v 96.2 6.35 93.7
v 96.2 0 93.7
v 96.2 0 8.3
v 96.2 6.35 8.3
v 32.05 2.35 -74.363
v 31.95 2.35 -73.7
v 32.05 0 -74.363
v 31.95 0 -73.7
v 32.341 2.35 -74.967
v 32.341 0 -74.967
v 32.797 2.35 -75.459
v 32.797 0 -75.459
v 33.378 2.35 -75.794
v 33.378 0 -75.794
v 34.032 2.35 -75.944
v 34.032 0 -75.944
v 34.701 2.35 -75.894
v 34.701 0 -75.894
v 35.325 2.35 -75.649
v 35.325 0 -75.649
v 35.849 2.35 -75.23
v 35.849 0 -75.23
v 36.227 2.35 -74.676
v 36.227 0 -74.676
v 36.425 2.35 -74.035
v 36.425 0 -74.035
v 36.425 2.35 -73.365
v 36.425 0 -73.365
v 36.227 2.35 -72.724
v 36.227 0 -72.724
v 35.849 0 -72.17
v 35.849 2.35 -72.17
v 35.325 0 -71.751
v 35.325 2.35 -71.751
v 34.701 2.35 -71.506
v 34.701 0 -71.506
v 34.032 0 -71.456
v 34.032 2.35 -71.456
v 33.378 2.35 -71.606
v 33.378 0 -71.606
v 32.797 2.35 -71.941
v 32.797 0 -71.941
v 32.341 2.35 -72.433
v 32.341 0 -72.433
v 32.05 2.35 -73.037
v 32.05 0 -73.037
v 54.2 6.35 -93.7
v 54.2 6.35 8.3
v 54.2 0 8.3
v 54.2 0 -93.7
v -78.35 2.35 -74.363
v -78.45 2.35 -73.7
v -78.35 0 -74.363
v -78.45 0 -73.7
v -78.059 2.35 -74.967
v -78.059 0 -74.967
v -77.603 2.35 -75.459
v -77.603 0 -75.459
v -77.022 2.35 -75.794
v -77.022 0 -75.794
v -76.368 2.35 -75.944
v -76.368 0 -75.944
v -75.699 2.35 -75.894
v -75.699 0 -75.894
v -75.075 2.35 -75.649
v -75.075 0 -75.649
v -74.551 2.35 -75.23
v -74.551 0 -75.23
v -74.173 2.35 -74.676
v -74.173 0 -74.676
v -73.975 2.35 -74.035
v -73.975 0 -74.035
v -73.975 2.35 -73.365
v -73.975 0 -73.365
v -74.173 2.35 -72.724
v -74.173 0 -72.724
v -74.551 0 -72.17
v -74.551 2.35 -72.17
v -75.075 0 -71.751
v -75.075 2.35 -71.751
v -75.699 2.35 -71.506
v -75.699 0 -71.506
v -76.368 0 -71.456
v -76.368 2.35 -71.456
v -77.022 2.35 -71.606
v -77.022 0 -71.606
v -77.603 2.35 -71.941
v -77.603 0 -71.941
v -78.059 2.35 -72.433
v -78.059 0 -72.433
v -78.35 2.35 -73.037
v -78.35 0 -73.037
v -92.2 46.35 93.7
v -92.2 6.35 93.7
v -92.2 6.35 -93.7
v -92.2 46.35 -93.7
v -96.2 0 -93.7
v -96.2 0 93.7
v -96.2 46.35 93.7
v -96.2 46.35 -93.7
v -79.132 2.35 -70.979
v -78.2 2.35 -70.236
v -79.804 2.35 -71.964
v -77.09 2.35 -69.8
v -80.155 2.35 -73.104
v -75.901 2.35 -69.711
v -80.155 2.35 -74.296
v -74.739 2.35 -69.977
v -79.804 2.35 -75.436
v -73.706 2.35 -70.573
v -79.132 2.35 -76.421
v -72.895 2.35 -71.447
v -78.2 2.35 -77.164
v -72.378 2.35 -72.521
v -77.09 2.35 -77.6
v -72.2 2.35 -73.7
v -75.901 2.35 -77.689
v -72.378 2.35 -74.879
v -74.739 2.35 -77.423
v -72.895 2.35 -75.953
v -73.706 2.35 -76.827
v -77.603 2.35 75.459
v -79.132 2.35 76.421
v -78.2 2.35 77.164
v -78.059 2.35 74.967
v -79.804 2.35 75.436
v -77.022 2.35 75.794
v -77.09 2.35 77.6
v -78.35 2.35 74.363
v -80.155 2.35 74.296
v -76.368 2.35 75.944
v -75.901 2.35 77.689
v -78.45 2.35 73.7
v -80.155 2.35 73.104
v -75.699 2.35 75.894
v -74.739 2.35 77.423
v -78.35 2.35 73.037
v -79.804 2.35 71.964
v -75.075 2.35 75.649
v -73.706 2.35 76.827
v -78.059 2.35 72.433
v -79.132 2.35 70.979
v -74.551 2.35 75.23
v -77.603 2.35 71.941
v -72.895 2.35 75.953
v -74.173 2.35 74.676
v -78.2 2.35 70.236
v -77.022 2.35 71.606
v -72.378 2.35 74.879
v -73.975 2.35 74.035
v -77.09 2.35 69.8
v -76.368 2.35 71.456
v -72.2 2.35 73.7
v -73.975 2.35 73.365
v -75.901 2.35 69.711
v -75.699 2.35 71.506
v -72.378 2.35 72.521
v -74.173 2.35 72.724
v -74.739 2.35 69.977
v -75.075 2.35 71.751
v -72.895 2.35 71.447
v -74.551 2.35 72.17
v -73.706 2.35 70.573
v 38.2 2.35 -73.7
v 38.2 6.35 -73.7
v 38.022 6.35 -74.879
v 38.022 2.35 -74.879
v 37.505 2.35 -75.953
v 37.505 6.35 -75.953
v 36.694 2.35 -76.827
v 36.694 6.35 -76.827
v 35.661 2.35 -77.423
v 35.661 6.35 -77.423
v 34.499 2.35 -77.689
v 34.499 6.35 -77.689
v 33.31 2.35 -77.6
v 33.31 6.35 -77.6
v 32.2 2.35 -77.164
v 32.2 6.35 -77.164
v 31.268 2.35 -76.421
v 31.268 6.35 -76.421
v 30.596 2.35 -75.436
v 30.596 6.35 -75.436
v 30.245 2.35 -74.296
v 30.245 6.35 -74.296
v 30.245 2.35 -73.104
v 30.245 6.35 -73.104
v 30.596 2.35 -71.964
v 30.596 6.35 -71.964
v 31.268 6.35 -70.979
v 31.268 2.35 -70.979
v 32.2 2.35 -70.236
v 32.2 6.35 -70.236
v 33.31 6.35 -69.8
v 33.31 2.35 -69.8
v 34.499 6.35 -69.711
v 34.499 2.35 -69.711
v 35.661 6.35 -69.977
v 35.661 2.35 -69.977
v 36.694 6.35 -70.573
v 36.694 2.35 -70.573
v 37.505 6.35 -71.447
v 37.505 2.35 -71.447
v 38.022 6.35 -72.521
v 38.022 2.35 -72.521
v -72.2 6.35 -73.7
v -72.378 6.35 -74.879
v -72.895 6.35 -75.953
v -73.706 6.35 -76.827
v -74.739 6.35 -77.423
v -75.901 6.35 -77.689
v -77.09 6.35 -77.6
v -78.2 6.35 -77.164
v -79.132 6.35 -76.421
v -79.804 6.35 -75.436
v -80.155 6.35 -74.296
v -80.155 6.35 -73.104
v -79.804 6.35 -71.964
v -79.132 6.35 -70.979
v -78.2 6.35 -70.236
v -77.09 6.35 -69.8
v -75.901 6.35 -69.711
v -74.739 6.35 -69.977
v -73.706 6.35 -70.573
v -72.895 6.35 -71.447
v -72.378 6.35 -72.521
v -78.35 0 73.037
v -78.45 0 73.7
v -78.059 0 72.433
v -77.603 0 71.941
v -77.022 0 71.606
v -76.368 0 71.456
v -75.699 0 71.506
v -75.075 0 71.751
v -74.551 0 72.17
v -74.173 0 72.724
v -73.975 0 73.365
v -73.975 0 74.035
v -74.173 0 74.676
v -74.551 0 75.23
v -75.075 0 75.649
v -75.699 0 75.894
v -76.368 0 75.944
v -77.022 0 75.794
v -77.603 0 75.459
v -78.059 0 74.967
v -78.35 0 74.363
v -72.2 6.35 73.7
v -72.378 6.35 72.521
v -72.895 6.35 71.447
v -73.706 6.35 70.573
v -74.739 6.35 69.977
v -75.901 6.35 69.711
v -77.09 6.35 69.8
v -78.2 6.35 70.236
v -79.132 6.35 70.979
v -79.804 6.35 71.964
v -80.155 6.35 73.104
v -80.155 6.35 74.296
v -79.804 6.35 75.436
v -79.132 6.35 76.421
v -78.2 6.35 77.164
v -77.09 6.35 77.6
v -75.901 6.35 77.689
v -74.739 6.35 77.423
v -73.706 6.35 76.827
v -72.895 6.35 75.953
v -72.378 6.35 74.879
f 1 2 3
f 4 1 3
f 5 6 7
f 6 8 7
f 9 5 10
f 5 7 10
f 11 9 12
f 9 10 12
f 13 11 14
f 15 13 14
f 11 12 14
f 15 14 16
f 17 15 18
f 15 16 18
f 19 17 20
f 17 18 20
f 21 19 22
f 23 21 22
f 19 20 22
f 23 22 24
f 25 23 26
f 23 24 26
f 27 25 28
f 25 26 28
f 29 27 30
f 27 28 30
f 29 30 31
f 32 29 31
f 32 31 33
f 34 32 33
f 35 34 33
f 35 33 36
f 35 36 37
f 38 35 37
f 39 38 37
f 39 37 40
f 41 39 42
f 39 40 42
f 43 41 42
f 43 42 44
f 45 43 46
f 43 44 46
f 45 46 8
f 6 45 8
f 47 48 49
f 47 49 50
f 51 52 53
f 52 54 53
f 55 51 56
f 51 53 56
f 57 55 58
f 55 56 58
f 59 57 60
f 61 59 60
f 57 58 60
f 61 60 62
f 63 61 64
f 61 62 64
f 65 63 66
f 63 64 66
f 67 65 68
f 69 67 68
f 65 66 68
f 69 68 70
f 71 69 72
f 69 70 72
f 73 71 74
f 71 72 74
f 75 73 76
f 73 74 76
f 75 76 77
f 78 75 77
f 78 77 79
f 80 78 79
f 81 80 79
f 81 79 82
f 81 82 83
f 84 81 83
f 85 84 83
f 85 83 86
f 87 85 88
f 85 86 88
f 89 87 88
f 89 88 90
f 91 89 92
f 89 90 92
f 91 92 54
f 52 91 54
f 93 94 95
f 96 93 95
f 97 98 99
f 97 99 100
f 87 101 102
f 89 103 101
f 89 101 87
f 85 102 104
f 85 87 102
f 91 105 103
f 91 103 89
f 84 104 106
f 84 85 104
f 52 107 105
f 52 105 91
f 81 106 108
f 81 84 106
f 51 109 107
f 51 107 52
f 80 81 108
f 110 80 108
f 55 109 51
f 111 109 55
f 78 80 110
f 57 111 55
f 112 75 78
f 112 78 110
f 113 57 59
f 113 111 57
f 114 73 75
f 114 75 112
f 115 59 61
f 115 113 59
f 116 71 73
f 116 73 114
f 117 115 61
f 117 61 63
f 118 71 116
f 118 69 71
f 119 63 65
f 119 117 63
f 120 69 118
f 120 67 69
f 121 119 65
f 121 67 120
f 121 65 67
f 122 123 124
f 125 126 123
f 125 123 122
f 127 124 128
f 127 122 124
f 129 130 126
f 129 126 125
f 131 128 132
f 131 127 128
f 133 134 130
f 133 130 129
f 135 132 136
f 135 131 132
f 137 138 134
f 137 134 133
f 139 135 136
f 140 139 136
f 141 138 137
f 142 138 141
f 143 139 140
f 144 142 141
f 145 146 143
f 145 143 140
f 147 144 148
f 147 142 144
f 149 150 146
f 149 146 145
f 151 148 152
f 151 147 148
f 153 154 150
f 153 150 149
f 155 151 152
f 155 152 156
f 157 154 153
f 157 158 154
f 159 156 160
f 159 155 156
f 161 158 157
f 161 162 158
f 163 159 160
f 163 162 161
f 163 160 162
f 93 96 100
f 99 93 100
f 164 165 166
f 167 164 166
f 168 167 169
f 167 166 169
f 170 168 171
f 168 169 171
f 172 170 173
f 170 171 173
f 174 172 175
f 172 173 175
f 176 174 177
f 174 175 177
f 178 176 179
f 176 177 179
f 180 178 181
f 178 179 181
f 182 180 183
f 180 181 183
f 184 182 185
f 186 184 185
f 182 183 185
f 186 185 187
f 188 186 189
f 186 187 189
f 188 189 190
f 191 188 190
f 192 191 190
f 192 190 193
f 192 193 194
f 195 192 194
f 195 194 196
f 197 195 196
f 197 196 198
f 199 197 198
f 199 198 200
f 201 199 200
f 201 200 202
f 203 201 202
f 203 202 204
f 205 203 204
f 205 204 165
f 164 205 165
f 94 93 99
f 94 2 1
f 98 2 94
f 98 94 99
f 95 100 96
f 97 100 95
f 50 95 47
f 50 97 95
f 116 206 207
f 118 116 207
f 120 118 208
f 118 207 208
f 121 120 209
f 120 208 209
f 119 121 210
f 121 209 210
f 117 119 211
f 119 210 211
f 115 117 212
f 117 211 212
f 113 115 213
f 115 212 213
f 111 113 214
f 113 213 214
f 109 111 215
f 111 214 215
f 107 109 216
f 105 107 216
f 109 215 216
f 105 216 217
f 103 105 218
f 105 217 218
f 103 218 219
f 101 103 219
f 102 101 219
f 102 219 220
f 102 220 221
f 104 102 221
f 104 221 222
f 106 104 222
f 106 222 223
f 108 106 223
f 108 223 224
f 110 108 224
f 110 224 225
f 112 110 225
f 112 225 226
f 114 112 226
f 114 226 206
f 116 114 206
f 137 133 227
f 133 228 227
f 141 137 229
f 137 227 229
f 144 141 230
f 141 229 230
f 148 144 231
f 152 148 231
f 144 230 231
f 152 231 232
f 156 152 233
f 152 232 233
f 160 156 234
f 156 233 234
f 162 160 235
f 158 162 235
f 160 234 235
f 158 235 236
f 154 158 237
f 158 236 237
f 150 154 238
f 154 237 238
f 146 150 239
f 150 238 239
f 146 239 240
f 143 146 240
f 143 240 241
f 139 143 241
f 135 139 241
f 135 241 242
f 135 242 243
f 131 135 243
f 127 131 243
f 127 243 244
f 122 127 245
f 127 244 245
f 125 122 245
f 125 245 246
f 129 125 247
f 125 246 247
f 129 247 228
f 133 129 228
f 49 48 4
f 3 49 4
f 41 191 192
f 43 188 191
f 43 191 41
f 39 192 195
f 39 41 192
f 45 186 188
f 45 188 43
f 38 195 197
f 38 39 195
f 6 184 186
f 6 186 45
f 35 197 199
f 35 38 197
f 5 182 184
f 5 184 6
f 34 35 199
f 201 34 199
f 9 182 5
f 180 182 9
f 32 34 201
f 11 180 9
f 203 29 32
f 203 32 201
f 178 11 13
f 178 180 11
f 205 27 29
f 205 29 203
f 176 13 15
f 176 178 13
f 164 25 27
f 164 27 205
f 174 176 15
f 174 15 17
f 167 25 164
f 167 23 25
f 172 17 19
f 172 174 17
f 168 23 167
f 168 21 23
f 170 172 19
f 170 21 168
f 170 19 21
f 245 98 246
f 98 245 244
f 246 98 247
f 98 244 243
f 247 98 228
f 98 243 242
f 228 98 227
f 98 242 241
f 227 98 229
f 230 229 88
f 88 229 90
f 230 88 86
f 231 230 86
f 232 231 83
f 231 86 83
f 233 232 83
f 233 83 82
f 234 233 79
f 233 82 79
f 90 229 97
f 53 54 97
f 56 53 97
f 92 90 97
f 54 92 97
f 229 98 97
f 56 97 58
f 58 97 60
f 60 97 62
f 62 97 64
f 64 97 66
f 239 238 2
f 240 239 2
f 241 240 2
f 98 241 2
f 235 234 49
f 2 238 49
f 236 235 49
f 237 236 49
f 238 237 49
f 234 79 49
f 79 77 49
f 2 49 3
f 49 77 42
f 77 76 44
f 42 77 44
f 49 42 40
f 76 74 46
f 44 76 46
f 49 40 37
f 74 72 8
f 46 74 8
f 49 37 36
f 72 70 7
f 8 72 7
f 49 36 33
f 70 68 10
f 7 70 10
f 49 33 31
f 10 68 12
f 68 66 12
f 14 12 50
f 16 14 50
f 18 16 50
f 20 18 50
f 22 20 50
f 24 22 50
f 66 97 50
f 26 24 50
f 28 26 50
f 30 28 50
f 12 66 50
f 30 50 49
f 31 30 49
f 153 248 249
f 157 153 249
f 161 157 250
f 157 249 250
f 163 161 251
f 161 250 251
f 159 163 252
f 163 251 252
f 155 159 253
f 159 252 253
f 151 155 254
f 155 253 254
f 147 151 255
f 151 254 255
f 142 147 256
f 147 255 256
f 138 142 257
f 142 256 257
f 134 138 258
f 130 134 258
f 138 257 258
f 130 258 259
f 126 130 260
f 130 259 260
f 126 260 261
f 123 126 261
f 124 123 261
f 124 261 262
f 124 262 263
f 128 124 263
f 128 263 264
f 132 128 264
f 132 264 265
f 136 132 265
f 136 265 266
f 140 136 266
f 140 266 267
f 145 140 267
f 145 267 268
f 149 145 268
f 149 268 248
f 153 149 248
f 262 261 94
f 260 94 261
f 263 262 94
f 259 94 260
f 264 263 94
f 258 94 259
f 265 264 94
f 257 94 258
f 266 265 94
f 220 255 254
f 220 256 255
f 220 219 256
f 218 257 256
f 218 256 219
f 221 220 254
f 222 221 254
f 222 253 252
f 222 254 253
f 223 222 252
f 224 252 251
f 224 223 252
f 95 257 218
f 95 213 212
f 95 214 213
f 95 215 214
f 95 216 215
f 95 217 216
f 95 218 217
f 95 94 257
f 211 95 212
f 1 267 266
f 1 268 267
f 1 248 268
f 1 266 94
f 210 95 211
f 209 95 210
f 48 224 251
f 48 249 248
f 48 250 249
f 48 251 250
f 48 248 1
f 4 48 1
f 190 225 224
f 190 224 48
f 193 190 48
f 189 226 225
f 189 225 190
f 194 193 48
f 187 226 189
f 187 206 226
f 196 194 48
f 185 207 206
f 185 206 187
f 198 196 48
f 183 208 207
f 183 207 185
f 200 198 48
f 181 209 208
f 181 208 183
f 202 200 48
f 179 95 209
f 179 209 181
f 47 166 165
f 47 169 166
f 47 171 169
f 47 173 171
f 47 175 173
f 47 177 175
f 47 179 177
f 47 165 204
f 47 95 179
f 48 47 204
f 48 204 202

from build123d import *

# Parameters (mm, degrees)
SKETCH1_W                      = 192.4
SKETCH1_H                      = 187.4
BOSS_EXTRUDE1_DEPTH            = 6.35
BOSS_EXTRUDE2_DEPTH            = 40
CUT_EXTRUDE1_REACH             = 142.122
SKETCH4_W                      = 42
SKETCH4_H                      = 102
CBORE_FOR_M4_SHCS1_D           = 4.5
CBORE_FOR_M4_SHCS1_CBORE_D     = 8
CBORE_FOR_M4_SHCS1_CBORE_DEPTH = 4


with BuildPart() as part:
    # Sketch1 → Boss-Extrude1 (new body)
    with BuildSketch(Plane(origin=(0, 0, 0), x_dir=(1, 0, 0), z_dir=(0, 1, 0))):
        Rectangle(SKETCH1_W, SKETCH1_H)
    extrude(amount=BOSS_EXTRUDE1_DEPTH)

    # Sketch2 → Boss-Extrude2 (add)
    with BuildSketch(Plane(origin=(0, 6.35, 0), x_dir=(1, 0, 0), z_dir=(0, 1, 0))):
        Polygon((-92.2, 89.7), (-92.2, -89.7), (-92.2, -93.7), (-96.2, -93.7), (-96.2, 93.7), (-92.2, 93.7), align=None)
    extrude(amount=BOSS_EXTRUDE2_DEPTH)

    # Sketch4 → Cut-Extrude1 (cut, up to next)
    with BuildSketch(Plane(origin=(0, 6.35, 0), x_dir=(1, 0, 0), z_dir=(0, 1, 0)), mode=Mode.PRIVATE) as cut_extrude1_sk1:
        with Locations((75.2, 42.7)):
            Rectangle(SKETCH4_W, SKETCH4_H)
    cut_extrude1_tool1 = extrude(cut_extrude1_sk1.sketch, amount=-CUT_EXTRUDE1_REACH, mode=Mode.PRIVATE) & part.part
    add(cut_extrude1_tool1.solids().sort_by_distance((75.2, 6.35, -42.7))[0], mode=Mode.SUBTRACT)

    # CBORE for M4 SHCS1 (through all)
    with Locations(Plane(origin=(0, 6.35, 0), x_dir=(1, 0, 0), z_dir=(0, 1, 0))):
        with Locations((34.2, 73.7), (-76.2, 73.7), (-76.2, -73.7)):
            CounterBoreHole(CBORE_FOR_M4_SHCS1_D / 2, CBORE_FOR_M4_SHCS1_CBORE_D / 2, CBORE_FOR_M4_SHCS1_CBORE_DEPTH)


solid = part.part
